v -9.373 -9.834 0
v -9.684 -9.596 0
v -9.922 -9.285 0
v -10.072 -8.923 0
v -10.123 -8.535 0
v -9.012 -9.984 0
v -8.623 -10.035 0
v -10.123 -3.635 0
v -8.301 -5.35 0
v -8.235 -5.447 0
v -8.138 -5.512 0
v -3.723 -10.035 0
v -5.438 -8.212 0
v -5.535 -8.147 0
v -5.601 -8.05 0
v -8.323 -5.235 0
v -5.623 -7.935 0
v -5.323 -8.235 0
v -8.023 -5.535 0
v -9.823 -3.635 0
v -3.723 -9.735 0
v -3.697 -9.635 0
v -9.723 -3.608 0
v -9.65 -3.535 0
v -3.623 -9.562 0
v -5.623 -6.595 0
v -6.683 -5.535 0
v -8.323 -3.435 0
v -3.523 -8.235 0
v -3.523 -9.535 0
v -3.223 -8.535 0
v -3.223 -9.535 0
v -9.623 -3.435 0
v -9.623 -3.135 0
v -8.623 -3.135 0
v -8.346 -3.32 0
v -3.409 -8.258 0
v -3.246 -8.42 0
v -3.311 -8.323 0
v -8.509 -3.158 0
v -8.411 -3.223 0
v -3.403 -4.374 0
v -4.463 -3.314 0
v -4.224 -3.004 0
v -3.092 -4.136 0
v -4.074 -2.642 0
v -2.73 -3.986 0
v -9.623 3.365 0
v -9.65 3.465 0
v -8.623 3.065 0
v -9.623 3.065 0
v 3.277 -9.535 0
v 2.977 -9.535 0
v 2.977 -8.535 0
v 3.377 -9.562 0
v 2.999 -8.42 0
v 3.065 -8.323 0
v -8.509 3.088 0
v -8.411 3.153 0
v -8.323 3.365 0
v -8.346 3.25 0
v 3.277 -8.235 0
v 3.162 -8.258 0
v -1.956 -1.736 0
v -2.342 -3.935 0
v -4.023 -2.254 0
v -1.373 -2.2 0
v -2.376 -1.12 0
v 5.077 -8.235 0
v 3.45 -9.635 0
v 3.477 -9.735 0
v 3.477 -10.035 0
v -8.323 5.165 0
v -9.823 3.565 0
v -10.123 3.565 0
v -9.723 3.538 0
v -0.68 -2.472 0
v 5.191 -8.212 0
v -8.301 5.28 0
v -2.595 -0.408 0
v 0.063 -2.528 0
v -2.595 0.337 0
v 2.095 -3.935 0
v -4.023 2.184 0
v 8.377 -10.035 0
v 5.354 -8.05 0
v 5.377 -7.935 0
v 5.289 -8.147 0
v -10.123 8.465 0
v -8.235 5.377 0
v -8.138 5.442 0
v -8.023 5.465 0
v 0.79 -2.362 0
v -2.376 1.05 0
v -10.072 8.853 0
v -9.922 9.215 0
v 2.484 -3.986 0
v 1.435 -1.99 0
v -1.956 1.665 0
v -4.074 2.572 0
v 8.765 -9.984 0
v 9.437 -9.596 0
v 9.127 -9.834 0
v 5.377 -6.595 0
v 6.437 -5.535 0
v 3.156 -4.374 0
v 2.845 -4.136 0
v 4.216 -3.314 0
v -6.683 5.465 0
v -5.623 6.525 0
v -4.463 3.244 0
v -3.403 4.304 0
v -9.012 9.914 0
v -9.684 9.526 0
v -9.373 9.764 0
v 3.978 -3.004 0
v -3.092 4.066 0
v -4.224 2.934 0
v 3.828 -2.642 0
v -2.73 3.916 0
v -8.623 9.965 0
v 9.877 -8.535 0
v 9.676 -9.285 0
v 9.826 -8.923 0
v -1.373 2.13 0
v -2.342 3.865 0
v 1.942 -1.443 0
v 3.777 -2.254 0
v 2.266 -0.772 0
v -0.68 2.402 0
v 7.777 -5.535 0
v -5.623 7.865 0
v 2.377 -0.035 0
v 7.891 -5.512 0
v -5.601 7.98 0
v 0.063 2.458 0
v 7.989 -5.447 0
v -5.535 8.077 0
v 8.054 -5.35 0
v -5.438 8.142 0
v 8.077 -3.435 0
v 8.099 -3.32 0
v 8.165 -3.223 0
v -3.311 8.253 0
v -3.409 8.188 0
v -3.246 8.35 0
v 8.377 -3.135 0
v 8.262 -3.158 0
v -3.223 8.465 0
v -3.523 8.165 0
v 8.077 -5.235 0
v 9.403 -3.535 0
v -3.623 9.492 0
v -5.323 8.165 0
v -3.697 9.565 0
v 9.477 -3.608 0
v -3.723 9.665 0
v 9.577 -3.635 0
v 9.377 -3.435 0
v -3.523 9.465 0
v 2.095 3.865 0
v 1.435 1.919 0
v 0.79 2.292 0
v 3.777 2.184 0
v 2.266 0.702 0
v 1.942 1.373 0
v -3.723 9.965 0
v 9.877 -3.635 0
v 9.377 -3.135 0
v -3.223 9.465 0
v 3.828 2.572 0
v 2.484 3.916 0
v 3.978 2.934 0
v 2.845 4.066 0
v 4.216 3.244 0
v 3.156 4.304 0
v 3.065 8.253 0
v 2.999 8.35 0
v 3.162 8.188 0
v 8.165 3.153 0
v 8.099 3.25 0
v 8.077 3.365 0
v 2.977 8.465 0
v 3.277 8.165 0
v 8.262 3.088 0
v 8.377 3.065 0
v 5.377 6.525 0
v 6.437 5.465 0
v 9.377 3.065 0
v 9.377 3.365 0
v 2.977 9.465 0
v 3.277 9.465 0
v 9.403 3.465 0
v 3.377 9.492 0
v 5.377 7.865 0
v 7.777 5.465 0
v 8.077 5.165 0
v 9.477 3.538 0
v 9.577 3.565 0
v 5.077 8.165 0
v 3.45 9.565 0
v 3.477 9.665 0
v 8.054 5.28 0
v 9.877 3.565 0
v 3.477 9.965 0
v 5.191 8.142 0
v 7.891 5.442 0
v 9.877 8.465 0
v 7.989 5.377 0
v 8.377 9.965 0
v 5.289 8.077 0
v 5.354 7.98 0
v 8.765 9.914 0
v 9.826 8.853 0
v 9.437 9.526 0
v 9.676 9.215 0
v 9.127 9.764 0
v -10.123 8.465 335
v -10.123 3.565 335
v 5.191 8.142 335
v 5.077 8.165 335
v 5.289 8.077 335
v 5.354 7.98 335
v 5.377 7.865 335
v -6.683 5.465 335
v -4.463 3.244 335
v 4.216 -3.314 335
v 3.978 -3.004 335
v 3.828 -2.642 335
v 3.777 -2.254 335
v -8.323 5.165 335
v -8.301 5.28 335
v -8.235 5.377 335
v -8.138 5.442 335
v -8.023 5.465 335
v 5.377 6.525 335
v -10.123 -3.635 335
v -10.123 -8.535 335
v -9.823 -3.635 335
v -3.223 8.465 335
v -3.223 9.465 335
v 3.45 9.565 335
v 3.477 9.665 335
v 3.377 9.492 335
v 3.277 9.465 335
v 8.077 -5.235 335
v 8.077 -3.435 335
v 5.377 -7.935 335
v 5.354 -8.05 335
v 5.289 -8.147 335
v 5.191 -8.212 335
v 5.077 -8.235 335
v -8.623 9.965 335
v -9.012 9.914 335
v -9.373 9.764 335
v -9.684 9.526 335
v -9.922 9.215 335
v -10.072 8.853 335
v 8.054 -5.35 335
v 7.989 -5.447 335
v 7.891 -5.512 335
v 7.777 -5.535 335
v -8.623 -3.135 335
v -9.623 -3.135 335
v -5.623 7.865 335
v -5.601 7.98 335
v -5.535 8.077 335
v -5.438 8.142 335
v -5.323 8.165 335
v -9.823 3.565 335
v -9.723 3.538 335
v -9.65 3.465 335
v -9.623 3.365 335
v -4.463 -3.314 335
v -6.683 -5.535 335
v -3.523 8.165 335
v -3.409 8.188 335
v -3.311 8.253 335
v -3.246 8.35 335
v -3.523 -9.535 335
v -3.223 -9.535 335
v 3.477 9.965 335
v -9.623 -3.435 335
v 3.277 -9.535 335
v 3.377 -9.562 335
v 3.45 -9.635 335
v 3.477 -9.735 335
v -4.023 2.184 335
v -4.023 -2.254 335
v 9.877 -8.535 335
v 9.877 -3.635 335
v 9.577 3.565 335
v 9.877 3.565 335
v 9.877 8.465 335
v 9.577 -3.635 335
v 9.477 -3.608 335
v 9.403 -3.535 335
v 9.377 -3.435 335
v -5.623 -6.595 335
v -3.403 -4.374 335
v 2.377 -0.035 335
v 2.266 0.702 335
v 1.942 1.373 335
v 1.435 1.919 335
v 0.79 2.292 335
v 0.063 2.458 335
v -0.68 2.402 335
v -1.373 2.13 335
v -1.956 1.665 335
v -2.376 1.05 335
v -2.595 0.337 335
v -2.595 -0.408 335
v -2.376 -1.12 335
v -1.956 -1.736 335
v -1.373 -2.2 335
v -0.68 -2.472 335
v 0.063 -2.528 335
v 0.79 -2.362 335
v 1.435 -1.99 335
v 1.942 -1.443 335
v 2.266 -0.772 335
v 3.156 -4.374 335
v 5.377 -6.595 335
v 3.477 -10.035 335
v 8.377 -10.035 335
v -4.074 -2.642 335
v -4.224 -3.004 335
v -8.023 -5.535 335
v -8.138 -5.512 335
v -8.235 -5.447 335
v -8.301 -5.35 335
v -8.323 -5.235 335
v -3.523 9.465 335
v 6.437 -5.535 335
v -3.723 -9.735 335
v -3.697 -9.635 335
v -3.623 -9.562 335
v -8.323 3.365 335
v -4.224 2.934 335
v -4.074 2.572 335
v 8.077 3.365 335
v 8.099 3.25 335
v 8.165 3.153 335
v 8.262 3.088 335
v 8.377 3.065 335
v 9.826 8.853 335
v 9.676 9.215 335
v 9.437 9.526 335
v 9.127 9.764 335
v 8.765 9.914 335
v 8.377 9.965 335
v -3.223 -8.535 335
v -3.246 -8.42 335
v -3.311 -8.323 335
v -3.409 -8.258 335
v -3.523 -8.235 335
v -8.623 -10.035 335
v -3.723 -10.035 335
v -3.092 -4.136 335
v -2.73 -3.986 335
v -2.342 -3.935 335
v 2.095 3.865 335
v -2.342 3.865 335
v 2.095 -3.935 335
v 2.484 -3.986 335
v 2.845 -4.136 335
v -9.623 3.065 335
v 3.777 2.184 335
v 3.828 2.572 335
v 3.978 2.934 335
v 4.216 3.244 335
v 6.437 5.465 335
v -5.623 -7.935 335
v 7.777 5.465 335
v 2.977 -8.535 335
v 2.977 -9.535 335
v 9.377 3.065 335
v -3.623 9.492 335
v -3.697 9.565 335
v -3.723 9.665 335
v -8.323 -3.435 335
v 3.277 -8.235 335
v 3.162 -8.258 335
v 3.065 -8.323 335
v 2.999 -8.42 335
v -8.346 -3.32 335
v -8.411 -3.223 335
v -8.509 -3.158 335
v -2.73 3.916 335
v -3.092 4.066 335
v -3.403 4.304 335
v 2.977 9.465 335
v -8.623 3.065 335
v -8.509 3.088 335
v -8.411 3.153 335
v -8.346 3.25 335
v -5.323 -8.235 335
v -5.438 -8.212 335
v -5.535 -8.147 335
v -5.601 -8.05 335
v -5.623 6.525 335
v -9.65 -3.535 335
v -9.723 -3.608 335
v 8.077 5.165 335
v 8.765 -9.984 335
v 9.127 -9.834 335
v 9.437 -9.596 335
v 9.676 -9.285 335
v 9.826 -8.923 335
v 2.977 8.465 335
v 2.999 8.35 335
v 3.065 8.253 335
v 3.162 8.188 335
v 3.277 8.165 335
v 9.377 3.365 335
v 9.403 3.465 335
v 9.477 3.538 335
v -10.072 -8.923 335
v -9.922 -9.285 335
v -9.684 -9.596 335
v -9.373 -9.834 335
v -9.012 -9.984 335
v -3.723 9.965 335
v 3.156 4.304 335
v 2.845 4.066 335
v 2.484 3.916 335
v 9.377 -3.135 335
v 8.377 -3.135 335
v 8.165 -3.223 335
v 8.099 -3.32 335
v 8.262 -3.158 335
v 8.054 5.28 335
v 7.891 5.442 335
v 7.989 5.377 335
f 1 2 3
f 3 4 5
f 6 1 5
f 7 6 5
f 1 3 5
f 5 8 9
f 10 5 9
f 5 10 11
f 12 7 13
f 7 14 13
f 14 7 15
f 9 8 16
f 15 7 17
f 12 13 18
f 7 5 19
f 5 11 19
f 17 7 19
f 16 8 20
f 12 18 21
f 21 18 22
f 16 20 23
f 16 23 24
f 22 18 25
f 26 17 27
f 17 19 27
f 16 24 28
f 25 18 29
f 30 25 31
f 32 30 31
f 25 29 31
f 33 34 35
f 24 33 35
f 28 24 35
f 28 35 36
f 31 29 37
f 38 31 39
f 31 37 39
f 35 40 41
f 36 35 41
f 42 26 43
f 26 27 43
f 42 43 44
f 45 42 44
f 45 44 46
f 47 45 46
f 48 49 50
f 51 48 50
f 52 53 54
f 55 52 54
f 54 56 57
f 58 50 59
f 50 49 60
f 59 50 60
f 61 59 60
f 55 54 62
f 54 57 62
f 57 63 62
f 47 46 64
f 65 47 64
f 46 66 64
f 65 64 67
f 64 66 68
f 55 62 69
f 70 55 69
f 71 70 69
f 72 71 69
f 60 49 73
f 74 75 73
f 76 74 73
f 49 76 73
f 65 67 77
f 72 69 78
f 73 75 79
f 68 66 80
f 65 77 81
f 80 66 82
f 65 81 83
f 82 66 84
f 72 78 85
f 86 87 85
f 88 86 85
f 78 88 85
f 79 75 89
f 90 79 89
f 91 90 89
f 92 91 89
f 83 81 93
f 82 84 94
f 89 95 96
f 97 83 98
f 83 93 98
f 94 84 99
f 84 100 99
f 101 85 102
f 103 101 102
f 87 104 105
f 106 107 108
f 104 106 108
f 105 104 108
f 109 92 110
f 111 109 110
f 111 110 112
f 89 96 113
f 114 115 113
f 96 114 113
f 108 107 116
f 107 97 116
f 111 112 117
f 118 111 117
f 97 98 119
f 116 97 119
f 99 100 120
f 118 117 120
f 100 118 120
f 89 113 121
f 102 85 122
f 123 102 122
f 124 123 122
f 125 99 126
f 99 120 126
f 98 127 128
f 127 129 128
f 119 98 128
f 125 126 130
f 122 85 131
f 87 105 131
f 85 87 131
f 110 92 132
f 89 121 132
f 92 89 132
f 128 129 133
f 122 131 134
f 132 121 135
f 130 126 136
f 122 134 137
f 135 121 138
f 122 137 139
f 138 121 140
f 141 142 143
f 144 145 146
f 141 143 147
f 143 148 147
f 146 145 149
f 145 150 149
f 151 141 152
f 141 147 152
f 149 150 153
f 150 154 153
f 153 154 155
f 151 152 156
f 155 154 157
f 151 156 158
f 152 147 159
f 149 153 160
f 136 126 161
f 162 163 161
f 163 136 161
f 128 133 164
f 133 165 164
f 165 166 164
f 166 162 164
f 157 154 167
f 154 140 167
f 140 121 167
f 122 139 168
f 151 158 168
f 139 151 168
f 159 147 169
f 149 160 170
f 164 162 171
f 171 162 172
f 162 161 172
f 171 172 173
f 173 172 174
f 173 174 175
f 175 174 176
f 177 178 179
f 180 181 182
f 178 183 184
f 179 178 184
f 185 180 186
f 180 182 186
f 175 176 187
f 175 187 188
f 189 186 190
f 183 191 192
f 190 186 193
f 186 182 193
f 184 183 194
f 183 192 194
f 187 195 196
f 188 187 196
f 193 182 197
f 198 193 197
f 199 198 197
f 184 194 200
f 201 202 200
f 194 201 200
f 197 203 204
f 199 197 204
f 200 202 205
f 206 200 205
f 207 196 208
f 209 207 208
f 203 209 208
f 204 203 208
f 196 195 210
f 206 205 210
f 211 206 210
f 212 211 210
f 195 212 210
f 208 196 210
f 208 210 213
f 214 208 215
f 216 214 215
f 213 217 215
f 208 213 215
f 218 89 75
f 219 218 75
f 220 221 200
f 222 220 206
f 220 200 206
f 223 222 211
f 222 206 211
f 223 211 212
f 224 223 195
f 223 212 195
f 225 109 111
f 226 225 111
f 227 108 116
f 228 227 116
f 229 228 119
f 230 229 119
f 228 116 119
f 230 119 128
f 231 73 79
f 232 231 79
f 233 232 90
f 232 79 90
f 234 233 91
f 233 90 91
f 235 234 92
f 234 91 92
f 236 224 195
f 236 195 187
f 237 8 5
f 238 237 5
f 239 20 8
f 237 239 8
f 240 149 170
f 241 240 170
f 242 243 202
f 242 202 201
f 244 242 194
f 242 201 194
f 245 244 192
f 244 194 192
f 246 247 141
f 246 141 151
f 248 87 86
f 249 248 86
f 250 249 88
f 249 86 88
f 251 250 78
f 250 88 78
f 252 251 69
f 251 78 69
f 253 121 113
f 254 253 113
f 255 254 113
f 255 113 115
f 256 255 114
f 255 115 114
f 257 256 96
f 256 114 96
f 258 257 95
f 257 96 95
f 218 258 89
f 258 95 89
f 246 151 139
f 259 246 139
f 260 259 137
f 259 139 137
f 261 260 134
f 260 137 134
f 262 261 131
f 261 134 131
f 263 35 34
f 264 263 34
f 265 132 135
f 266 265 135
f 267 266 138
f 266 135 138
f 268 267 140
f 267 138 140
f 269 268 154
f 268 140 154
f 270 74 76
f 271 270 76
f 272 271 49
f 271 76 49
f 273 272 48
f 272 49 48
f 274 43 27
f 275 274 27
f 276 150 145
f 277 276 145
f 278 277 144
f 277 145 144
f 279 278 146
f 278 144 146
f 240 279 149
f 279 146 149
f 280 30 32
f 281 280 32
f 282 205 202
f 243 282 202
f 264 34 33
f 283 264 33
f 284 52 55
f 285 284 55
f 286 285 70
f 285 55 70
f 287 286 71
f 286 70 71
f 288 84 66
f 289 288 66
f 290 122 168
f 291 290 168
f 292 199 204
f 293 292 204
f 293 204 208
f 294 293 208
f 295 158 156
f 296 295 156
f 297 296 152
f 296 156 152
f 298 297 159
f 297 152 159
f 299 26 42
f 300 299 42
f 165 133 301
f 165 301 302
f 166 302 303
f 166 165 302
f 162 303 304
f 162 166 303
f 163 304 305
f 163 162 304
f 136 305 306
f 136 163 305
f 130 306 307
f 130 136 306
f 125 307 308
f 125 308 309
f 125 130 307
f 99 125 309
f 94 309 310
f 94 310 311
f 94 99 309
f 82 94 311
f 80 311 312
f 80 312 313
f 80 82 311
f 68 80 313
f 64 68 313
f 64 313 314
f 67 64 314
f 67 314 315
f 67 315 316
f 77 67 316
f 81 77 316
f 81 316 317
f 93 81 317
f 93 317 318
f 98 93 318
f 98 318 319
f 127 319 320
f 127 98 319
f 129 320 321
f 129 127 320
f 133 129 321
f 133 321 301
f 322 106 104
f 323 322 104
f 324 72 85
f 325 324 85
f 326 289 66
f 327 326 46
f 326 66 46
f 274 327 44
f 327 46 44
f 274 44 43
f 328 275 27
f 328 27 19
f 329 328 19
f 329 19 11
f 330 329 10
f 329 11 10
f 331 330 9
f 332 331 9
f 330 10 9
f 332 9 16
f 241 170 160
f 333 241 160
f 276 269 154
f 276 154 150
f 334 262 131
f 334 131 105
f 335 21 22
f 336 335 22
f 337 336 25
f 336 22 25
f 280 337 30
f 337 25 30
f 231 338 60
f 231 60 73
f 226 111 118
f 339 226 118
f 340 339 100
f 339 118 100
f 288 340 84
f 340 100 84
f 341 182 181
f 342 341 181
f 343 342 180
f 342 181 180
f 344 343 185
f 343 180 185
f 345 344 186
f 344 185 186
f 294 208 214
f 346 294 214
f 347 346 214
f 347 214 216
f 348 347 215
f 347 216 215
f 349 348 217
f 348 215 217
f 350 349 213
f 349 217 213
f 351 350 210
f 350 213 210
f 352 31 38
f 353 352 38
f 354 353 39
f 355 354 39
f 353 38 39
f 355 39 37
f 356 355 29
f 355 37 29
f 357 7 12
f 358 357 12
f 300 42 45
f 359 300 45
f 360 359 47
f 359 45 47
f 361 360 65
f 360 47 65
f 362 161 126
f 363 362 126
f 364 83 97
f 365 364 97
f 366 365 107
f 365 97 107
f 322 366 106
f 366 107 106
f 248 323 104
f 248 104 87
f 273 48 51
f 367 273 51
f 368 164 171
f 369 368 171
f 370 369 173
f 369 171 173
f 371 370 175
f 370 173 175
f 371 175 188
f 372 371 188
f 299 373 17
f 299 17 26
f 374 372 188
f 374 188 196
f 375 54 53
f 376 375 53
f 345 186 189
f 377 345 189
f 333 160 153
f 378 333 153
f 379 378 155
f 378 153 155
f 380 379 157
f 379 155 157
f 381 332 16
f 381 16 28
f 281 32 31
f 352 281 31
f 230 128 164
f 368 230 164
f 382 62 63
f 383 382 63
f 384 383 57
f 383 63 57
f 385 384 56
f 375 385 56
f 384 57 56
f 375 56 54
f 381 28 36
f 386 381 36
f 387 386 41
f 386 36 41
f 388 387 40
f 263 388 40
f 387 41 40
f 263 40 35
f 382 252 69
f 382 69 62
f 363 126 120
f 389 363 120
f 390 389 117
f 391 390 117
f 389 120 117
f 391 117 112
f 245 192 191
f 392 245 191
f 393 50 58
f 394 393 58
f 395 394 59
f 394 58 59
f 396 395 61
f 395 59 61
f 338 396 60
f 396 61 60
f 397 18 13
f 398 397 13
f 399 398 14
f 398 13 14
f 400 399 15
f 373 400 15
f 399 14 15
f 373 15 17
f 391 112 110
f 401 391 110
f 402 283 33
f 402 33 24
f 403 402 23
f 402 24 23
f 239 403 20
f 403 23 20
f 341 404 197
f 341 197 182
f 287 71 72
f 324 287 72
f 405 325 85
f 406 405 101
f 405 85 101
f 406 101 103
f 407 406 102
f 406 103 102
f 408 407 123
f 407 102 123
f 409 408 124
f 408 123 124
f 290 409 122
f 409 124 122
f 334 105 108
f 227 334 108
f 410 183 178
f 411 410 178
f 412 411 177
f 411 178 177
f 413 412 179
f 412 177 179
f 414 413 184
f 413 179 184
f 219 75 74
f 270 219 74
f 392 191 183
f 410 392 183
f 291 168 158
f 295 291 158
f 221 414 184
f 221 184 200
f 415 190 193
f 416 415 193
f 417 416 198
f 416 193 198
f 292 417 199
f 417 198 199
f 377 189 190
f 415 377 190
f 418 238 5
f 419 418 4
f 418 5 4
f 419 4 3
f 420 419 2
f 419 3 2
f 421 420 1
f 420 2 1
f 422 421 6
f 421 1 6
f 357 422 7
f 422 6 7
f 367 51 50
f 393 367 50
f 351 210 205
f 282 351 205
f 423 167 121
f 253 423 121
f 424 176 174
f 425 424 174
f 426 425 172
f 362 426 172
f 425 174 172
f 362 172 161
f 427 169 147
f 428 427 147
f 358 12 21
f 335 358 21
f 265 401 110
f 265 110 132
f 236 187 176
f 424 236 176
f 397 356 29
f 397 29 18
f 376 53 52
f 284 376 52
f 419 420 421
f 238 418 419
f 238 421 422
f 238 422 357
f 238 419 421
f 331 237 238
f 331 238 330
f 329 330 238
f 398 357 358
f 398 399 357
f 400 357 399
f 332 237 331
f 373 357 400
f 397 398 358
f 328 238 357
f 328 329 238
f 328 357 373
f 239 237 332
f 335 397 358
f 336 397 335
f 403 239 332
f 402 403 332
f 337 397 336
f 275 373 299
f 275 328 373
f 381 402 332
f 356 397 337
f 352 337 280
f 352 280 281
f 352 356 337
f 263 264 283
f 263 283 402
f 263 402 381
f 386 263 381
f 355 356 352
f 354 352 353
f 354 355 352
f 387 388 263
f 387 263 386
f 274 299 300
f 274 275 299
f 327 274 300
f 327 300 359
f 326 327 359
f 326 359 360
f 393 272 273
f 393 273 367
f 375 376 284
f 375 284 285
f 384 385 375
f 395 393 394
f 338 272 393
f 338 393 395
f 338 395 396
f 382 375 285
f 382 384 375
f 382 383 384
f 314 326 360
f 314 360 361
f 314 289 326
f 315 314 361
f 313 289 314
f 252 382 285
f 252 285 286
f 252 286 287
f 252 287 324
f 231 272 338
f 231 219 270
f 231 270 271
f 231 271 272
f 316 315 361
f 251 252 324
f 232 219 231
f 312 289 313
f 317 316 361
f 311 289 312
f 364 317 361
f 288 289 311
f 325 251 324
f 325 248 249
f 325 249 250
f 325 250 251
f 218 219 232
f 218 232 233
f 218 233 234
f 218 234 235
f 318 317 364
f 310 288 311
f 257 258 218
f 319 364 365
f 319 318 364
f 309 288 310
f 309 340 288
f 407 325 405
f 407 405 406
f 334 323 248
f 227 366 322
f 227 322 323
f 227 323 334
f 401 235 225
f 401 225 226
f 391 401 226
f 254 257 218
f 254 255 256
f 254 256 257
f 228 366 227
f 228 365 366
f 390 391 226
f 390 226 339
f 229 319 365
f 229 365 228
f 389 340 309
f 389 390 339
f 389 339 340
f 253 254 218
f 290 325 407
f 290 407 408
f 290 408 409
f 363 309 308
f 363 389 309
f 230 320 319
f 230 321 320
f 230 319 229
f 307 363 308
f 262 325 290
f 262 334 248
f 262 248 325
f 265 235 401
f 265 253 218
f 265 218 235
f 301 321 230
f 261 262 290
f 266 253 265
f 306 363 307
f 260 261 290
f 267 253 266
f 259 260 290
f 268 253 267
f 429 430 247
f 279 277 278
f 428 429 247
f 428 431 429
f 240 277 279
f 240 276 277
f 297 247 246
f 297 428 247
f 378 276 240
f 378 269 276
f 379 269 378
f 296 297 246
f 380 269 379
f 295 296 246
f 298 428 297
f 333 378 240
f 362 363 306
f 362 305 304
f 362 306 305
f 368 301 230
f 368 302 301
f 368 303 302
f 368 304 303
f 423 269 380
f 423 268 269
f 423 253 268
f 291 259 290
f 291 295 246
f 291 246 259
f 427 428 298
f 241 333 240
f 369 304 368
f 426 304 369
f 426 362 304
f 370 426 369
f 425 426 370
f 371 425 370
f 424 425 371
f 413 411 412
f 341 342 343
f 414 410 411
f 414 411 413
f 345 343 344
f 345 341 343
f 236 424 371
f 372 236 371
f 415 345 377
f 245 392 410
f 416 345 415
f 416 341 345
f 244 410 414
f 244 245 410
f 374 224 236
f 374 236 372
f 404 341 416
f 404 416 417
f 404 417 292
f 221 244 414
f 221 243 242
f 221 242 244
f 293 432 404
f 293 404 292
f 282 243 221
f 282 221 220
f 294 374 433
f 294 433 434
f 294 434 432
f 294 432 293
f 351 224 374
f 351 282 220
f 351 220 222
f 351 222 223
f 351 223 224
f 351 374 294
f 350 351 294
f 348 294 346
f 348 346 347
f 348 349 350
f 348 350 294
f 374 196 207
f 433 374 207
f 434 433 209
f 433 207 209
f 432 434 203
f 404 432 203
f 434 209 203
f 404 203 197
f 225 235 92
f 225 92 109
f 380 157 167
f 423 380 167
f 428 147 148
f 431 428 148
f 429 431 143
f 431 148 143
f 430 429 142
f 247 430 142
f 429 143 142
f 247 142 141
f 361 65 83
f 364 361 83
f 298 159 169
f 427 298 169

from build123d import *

# Parameters (mm, degrees)
SKETCH_1_R      = 2.5
EXTRUDE_1_DEPTH = 335


with BuildPart() as part:
    # 草图1 → 凸台-拉伸1 (new body)
    with BuildSketch(Plane.XY):
        with BuildLine():
            Line((4.215995631, 3.244230202), (6.436655803, 5.464890373))
            Line((6.436655803, 5.464890373), (7.776655803, 5.464890373))
            ThreePointArc((7.776655803, 5.464890373), (7.988787838, 5.377022408), (8.076655803, 5.164890373))
            Line((8.076655803, 5.164890373), (8.076655803, 3.364890373))
            ThreePointArc((8.076655803, 3.364890373), (8.164523769, 3.152758339), (8.376655803, 3.064890373))
            Line((8.376655803, 3.064890373), (9.376655803, 3.064890373))
            Line((9.376655803, 3.064890373), (9.376655803, 3.364890373))
            ThreePointArc((9.376655803, 3.364890373), (9.435234447, 3.50631173), (9.576655803, 3.564890373))
            Line((9.576655803, 3.564890373), (9.876655803, 3.564890373))
            Line((9.876655803, 3.564890373), (9.876655803, 8.464890373))
            ThreePointArc((9.876655803, 8.464890373), (9.437315975, 9.525550545), (8.376655803, 9.964890373))
            Line((8.376655803, 9.964890373), (3.476655803, 9.964890373))
            Line((3.476655803, 9.964890373), (3.476655803, 9.664890373))
            ThreePointArc((3.476655803, 9.664890373), (3.418077159, 9.523469017), (3.276655803, 9.464890373))
            Line((3.276655803, 9.464890373), (2.976655803, 9.464890373))
            Line((2.976655803, 9.464890373), (2.976655803, 8.464890373))
            ThreePointArc((2.976655803, 8.464890373), (3.064523769, 8.252758339), (3.276655803, 8.164890373))
            Line((3.276655803, 8.164890373), (5.076655803, 8.164890373))
            ThreePointArc((5.076655803, 8.164890373), (5.288787838, 8.077022408), (5.376655803, 7.864890373))
            Line((5.376655803, 7.864890373), (5.376655803, 6.524890373))
            Line((5.376655803, 6.524890373), (3.155995631, 4.304230202))
            ThreePointArc((3.155995631, 4.304230202), (2.669360608, 3.979071075), (2.09533546, 3.864890373))
            Line((2.09533546, 3.864890373), (-2.342023853, 3.864890373))
            ThreePointArc((-2.342023853, 3.864890373), (-2.916049002, 3.979071075), (-3.402684025, 4.304230202))
            Line((-3.402684025, 4.304230202), (-5.623344197, 6.524890373))
            Line((-5.623344197, 6.524890373), (-5.623344197, 7.864890373))
            ThreePointArc((-5.623344197, 7.864890373), (-5.535476231, 8.077022408), (-5.323344197, 8.164890373))
            Line((-5.323344197, 8.164890373), (-3.523344197, 8.164890373))
            ThreePointArc((-3.523344197, 8.164890373), (-3.311212162, 8.252758339), (-3.223344197, 8.464890373))
            Line((-3.223344197, 8.464890373), (-3.223344197, 9.464890373))
            Line((-3.223344197, 9.464890373), (-3.523344197, 9.464890373))
            ThreePointArc((-3.523344197, 9.464890373), (-3.664765553, 9.523469017), (-3.723344197, 9.664890373))
            Line((-3.723344197, 9.664890373), (-3.723344197, 9.964890373))
            Line((-3.723344197, 9.964890373), (-8.623344197, 9.964890373))
            ThreePointArc((-8.623344197, 9.964890373), (-9.684004369, 9.525550545), (-10.123344197, 8.464890373))
            Line((-10.123344197, 8.464890373), (-10.123344197, 3.564890373))
            Line((-10.123344197, 3.564890373), (-9.823344197, 3.564890373))
            ThreePointArc((-9.823344197, 3.564890373), (-9.681922841, 3.50631173), (-9.623344197, 3.364890373))
            Line((-9.623344197, 3.364890373), (-9.623344197, 3.064890373))
            Line((-9.623344197, 3.064890373), (-8.623344197, 3.064890373))
            ThreePointArc((-8.623344197, 3.064890373), (-8.411212162, 3.152758339), (-8.323344197, 3.364890373))
            Line((-8.323344197, 3.364890373), (-8.323344197, 5.164890373))
            ThreePointArc((-8.323344197, 5.164890373), (-8.235476231, 5.377022408), (-8.023344197, 5.464890373))
            Line((-8.023344197, 5.464890373), (-6.683344197, 5.464890373))
            Line((-6.683344197, 5.464890373), (-4.462684025, 3.244230202))
            ThreePointArc((-4.462684025, 3.244230202), (-4.137524898, 2.757595178), (-4.023344197, 2.18357003))
            Line((-4.023344197, 2.18357003), (-4.023344197, -2.253789283))
            ThreePointArc((-4.023344197, -2.253789283), (-4.137524898, -2.827814432), (-4.462684025, -3.314449455))
            Line((-4.462684025, -3.314449455), (-6.683344197, -5.535109627))
            Line((-6.683344197, -5.535109627), (-8.023344197, -5.535109627))
            ThreePointArc((-8.023344197, -5.535109627), (-8.235476231, -5.447241661), (-8.323344197, -5.235109627))
            Line((-8.323344197, -5.235109627), (-8.323344197, -3.435109627))
            ThreePointArc((-8.323344197, -3.435109627), (-8.411212162, -3.222977592), (-8.623344197, -3.135109627))
            Line((-8.623344197, -3.135109627), (-9.623344197, -3.135109627))
            Line((-9.623344197, -3.135109627), (-9.623344197, -3.435109627))
            ThreePointArc((-9.623344197, -3.435109627), (-9.681922841, -3.576530983), (-9.823344197, -3.635109627))
            Line((-9.823344197, -3.635109627), (-10.123344197, -3.635109627))
            Line((-10.123344197, -3.635109627), (-10.123344197, -8.535109627))
            ThreePointArc((-10.123344197, -8.535109627), (-9.684004369, -9.595769798), (-8.623344197, -10.035109627))
            Line((-8.623344197, -10.035109627), (-3.723344197, -10.035109627))
            Line((-3.723344197, -10.035109627), (-3.723344197, -9.735109627))
            ThreePointArc((-3.723344197, -9.735109627), (-3.664765553, -9.59368827), (-3.523344197, -9.535109627))
            Line((-3.523344197, -9.535109627), (-3.223344197, -9.535109627))
            Line((-3.223344197, -9.535109627), (-3.223344197, -8.535109627))
            ThreePointArc((-3.223344197, -8.535109627), (-3.311212162, -8.322977592), (-3.523344197, -8.235109627))
            Line((-3.523344197, -8.235109627), (-5.323344197, -8.235109627))
            ThreePointArc((-5.323344197, -8.235109627), (-5.535476231, -8.147241661), (-5.623344197, -7.935109627))
            Line((-5.623344197, -7.935109627), (-5.623344197, -6.595109627))
            Line((-5.623344197, -6.595109627), (-3.402684025, -4.374449455))
            ThreePointArc((-3.402684025, -4.374449455), (-2.916049002, -4.049290328), (-2.342023853, -3.935109627))
            Line((-2.342023853, -3.935109627), (2.09533546, -3.935109627))
            ThreePointArc((2.09533546, -3.935109627), (2.669360608, -4.049290328), (3.155995631, -4.374449455))
            Line((3.155995631, -4.374449455), (5.376655803, -6.595109627))
            Line((5.376655803, -6.595109627), (5.376655803, -7.935109627))
            ThreePointArc((5.376655803, -7.935109627), (5.288787838, -8.147241661), (5.076655803, -8.235109627))
            Line((5.076655803, -8.235109627), (3.276655803, -8.235109627))
            ThreePointArc((3.276655803, -8.235109627), (3.064523769, -8.322977592), (2.976655803, -8.535109627))
            Line((2.976655803, -8.535109627), (2.976655803, -9.535109627))
            Line((2.976655803, -9.535109627), (3.276655803, -9.535109627))
            ThreePointArc((3.276655803, -9.535109627), (3.418077159, -9.59368827), (3.476655803, -9.735109627))
            Line((3.476655803, -9.735109627), (3.476655803, -10.035109627))
            Line((3.476655803, -10.035109627), (8.376655803, -10.035109627))
            ThreePointArc((8.376655803, -10.035109627), (9.437315975, -9.595769798), (9.876655803, -8.535109627))
            Line((9.876655803, -8.535109627), (9.876655803, -3.635109627))
            Line((9.876655803, -3.635109627), (9.576655803, -3.635109627))
            ThreePointArc((9.576655803, -3.635109627), (9.435234447, -3.576530983), (9.376655803, -3.435109627))
            Line((9.376655803, -3.435109627), (9.376655803, -3.135109627))
            Line((9.376655803, -3.135109627), (8.376655803, -3.135109627))
            ThreePointArc((8.376655803, -3.135109627), (8.164523769, -3.222977592), (8.076655803, -3.435109627))
            Line((8.076655803, -3.435109627), (8.076655803, -5.235109627))
            ThreePointArc((8.076655803, -5.235109627), (7.988787838, -5.447241661), (7.776655803, -5.535109627))
            Line((7.776655803, -5.535109627), (6.436655803, -5.535109627))
            Line((6.436655803, -5.535109627), (4.215995631, -3.314449455))
            ThreePointArc((4.215995631, -3.314449455), (3.890836504, -2.827814432), (3.776655803, -2.253789283))
            Line((3.776655803, -2.253789283), (3.776655803, 2.18357003))
            ThreePointArc((3.776655803, 2.18357003), (3.890836504, 2.757595178), (4.215995631, 3.244230202))
        make_face()
        with Locations((-0.123344197, -0.035109627)):
            Circle(SKETCH_1_R, mode=Mode.SUBTRACT)
    extrude(amount=EXTRUDE_1_DEPTH)


solid = part.part
